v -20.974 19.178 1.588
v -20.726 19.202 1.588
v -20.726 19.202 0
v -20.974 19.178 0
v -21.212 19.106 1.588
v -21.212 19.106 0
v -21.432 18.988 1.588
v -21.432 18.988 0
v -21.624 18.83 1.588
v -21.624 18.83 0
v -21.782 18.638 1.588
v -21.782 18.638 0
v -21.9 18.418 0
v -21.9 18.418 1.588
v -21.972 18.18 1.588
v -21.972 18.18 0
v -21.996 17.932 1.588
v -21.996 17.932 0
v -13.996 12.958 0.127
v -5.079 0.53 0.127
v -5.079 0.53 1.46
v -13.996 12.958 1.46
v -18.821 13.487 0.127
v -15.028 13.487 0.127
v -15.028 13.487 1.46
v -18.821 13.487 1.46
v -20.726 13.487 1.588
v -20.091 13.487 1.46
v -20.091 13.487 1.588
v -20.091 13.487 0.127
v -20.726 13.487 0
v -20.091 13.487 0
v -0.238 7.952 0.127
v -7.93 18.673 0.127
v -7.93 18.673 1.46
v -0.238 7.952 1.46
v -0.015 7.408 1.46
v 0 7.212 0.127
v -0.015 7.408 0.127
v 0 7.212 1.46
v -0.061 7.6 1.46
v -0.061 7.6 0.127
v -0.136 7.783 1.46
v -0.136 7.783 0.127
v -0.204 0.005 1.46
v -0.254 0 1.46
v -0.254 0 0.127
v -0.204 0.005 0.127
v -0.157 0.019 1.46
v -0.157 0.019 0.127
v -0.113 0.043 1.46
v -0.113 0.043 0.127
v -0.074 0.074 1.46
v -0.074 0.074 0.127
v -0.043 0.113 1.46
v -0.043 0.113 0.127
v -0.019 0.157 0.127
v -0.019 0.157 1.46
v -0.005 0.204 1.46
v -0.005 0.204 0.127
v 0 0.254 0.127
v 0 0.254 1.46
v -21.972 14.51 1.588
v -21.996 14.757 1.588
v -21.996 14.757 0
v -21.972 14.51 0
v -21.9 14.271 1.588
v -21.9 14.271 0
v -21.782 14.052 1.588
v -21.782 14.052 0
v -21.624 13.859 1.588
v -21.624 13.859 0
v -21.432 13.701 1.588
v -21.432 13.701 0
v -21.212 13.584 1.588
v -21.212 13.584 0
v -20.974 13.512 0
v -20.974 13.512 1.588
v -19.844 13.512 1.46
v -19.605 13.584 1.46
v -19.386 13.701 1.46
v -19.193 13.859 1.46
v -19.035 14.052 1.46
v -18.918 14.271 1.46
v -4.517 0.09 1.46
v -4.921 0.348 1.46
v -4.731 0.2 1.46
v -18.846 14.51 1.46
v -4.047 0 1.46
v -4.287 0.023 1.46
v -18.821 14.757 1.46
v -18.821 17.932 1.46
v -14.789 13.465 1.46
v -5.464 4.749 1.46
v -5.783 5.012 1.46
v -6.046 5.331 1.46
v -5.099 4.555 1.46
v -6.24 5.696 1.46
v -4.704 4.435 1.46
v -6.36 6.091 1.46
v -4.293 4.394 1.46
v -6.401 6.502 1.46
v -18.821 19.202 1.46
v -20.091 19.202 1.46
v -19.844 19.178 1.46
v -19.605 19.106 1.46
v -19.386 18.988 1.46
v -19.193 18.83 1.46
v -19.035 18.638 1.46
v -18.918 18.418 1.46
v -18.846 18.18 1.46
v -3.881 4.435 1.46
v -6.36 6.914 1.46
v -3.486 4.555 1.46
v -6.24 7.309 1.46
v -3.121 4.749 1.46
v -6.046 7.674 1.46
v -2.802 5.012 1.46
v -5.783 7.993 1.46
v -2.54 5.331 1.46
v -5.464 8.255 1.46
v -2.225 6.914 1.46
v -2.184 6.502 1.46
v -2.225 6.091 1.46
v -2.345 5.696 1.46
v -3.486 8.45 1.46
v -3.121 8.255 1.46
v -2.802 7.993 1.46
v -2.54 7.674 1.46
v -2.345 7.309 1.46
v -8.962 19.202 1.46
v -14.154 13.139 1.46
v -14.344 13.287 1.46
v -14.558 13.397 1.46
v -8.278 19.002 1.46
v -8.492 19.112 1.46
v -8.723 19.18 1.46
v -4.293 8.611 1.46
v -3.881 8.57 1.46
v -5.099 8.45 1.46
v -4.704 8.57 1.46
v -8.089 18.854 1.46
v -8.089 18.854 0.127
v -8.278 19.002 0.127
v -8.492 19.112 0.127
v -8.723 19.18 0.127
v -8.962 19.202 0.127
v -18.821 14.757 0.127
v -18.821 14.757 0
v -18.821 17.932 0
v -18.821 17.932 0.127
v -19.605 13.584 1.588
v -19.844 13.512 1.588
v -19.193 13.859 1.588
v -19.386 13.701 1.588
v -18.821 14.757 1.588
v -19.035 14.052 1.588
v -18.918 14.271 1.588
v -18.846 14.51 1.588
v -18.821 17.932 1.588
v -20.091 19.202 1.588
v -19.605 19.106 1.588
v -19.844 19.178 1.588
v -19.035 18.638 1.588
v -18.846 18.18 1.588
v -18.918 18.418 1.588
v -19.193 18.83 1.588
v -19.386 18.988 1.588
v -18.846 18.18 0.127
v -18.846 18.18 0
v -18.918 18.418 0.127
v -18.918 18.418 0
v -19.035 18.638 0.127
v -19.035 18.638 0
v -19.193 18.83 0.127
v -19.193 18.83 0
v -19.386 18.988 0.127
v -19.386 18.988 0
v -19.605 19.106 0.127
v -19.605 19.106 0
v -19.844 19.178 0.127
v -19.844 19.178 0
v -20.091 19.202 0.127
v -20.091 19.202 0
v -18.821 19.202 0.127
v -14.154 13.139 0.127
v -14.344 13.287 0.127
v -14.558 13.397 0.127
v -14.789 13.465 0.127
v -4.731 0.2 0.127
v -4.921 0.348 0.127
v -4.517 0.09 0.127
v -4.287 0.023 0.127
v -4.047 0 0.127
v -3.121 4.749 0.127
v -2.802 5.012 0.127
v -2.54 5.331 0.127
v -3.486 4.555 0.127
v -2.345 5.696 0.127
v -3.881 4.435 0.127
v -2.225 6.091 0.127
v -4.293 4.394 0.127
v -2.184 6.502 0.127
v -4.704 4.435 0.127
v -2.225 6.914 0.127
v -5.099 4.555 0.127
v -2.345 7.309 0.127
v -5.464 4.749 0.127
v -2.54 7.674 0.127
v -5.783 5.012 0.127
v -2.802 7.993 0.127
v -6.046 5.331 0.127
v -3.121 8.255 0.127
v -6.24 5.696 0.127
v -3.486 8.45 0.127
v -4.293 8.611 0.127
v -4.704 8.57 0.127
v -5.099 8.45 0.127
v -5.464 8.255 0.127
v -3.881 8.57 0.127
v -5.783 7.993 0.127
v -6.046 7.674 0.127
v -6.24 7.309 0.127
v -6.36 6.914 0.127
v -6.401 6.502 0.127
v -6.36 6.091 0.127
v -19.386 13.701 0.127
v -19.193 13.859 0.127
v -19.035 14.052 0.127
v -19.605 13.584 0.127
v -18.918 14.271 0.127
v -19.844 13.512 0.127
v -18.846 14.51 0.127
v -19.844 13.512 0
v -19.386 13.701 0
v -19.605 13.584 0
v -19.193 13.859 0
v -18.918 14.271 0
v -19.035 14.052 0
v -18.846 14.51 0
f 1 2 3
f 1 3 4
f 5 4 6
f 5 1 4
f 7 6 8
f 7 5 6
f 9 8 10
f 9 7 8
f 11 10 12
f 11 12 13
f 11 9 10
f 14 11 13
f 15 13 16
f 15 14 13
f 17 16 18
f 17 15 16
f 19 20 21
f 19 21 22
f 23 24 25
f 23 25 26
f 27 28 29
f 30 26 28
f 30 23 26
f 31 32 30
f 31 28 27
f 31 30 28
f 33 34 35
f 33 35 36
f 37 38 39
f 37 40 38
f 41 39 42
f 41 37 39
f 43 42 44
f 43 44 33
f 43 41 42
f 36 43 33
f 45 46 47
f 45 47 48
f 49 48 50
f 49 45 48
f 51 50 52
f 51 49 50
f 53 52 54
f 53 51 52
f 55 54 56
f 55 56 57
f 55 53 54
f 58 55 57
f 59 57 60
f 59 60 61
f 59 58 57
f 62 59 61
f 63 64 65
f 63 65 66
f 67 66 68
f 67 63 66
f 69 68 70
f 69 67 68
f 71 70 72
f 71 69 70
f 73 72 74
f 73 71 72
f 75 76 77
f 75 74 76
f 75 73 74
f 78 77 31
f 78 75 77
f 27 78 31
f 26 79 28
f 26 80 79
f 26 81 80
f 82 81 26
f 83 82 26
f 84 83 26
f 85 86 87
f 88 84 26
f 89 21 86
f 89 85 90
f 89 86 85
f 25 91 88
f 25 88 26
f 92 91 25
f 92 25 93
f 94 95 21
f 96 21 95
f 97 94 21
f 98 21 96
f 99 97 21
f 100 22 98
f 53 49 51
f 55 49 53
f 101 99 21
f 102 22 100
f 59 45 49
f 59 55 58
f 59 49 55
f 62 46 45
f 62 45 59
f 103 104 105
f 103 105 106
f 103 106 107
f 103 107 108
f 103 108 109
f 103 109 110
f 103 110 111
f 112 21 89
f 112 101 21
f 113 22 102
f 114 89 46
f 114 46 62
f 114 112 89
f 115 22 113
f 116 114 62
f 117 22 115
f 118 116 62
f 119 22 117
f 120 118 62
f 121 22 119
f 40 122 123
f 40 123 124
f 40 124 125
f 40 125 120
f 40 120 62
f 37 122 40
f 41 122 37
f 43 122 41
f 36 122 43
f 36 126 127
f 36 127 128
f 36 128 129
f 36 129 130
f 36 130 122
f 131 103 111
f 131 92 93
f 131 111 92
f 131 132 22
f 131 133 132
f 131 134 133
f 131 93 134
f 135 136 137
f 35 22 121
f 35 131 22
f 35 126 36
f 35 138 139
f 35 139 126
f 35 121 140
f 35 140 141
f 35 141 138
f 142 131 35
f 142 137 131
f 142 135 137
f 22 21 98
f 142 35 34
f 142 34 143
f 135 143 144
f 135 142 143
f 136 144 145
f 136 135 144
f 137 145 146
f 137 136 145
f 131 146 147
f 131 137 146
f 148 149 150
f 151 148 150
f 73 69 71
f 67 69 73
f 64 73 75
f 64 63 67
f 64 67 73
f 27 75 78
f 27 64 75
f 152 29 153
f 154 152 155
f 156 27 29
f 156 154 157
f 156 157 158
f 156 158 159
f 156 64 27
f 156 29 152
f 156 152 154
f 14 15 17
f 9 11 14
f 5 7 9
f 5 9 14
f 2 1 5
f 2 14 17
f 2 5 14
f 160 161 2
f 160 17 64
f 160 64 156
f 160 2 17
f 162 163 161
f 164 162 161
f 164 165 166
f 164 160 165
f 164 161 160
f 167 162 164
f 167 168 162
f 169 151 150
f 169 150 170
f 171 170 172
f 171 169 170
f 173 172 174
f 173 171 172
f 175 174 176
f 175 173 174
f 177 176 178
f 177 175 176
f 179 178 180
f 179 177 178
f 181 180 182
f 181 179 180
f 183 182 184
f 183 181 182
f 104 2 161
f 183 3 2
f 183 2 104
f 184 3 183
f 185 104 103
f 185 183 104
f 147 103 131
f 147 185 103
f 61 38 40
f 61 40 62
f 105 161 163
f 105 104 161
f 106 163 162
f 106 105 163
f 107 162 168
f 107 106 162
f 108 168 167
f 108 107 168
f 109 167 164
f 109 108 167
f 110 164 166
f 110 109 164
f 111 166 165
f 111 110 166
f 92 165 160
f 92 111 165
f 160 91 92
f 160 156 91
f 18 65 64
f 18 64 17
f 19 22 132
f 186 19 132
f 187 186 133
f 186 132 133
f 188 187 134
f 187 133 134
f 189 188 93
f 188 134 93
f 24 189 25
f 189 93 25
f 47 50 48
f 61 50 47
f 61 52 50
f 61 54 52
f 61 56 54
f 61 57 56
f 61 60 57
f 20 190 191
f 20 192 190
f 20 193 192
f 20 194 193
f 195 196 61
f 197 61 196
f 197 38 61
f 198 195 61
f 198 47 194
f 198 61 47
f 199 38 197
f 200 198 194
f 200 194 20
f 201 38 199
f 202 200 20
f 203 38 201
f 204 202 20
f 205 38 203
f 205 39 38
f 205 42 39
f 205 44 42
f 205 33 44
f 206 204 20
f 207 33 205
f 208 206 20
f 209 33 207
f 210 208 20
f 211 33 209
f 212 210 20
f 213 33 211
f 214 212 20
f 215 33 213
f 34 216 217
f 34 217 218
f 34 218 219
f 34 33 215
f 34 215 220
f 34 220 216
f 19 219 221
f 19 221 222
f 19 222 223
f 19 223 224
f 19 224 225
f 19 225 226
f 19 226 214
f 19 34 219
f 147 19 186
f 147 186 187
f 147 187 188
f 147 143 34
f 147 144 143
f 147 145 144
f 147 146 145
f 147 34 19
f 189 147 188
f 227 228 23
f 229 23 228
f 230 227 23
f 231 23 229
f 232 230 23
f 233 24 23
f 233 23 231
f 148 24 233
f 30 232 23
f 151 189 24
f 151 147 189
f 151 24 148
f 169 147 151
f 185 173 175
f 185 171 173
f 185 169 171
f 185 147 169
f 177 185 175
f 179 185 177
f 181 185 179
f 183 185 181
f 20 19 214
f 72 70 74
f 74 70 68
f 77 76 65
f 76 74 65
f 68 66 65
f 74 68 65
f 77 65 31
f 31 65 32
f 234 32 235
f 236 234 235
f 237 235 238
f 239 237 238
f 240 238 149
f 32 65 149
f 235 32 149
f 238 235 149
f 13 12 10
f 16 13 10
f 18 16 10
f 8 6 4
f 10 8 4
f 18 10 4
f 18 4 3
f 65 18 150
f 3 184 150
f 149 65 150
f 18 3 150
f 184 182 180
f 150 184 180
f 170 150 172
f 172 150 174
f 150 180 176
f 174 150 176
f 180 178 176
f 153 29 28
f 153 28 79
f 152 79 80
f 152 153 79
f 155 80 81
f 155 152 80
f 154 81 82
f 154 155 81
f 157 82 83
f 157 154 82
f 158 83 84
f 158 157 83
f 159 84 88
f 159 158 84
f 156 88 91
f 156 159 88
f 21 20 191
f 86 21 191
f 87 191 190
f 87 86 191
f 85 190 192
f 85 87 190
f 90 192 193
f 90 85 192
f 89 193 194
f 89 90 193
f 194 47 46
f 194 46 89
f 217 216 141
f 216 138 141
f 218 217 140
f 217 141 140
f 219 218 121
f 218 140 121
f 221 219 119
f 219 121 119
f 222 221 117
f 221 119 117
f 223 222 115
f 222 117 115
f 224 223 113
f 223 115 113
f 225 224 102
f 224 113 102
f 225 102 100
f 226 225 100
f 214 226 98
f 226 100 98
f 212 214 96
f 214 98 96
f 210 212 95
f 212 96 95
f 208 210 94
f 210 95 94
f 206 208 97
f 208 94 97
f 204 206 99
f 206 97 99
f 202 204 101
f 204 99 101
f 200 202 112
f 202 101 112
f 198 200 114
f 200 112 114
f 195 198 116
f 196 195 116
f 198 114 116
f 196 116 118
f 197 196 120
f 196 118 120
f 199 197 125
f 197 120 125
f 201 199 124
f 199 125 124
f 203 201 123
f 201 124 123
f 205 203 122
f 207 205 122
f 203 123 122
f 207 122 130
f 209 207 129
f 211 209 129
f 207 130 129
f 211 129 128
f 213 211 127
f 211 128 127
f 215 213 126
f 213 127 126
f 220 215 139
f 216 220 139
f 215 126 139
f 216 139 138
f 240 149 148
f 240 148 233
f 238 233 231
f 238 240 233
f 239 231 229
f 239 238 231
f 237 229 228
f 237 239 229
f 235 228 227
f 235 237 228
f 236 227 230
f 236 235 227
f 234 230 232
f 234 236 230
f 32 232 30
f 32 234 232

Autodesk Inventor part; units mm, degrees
ref_plane "YZ Plane" through (0, 0, 0) normal (1, 0, 0) x (0, 1, 0)
ref_plane "XZ Plane" through (0, 0, 0) normal (0, 1, 0) x (-1, 0, 0)
ref_plane "XY Plane" through (0, 0, 0) normal (0, 0, 1) x (1, 0, 0)
sketch "Sketch1" plane through (0, 0, 0) normal (0, 0, 1) x (1, 0, 0)
  line L0 (0, 0) -> (-4.699, 0)
  line L1 (-4.699, 0) -> (-14.3764, 13.4874)
  line L2 (-14.3764, 13.4874) -> (-21.9964, 13.4874)
  line L3 (-21.9964, 13.4874) -> (-21.9964, 19.2024)
  line L4 (-21.9964, 19.2024) -> (-8.3105, 19.2024)
  line L5 (-8.3105, 19.2024) -> (0, 7.62)
  line L6 (0, 7.62) -> (0, 0)
  line L7 (0, 23.0429) -> (0, -3.8405) projected
  line L8 (-26.3957, 0) -> (4.3993, 0) projected
  dimension "d0" = 7.62
  dimension "d1" = 5.715
  dimension "d2" = 4.699
  dimension "d3" = 19.2024
  dimension "d4" = 21.9964
  dimension "d5" = 7.62
  dimension "d6" = 13.6859
  dimension "d7" = 14.2554
extrude "Extrusion1" add sketch "Sketch1" along normal blind 1.5875
sketch "Sketch2" plane through (0, 0, 0) normal (0, 0, 1) x (1, 0, 0)
  circle A0 centre (-4.2926, 6.5024) radius 0.635
  line L0 (-26.3957, 0) -> (4.3993, 0) projected
  line L1 (0, 23.0429) -> (0, -3.8405) projected
  line L2 (-21.9964, 13.4874) -> (-21.9964, 19.2024) projected
  line L3 (-21.9964, 19.2024) -> (-8.3105, 19.2024) projected
  point P0 (0, 0)
  dimension "d11" = 17.7038
  dimension "d12" = 12.7
  dimension "d13" = 1.27
hole "Hole1" at (-4.2926, 6.5024, 0) direction (0, 0, 1) diameter 4.2164 end through all
fillet "Fillet1" radius 1.27 6 edges at (-21.9964, 13.4874, 0.7937) (-14.3764, 13.4874, 0.7937) (-4.699, 0, 0.7937) (0, 7.62, 0.7937) (-8.3105, 19.2024, 0.7937) (-21.9964, 19.2024, 0.7937)
fillet "Fillet2" radius 0.254 1 edges at (0, 0, 0.7937)
sketch "Sketch3" plane through (0, 0, 1.5875) normal (0, 0, 1) x (1, 0, 0)
  line L0 (-20.7264, 19.2024) -> (-8.9624, 19.2024) projected
  circle A0 centre (-4.2926, 6.5024) radius 2.1082 projected
  line L1 (0, 0) -> (-18.8214, 0)
  line L2 (-18.8214, 0) -> (-18.8214, 19.2024)
  line L3 (-18.8214, 19.2024) -> (0, 19.2024)
  line L4 (0, 19.2024) -> (0, 0)
  point P0 (-21.9964, 17.9324)
  dimension "d23" = 3.175
extrude "Extrusion2" cut sketch "Sketch3" against normal blind 0.127
sketch "Sketch4" plane through (0, 0, 0) normal (0, 0, -1) x (-1, 0, 0)
  circle A0 centre (4.2926, 6.5024) radius 2.1082 projected
  line L0 (21.9964, 14.7574) -> (21.9964, 17.9324) projected
  line L1 (20.7264, 19.2024) -> (8.9624, 19.2024) projected
  line L2 (0, 0) -> (18.8214, 0)
  line L3 (18.8214, 0) -> (18.8214, 19.2024)
  line L4 (18.8214, 19.2024) -> (0, 19.2024)
  line L5 (0, 19.2024) -> (0, 0)
  dimension "d26" = 3.175
extrude "Extrusion3" cut sketch "Sketch4" against normal blind 0.127
fillet "Fillet3" radius 1.27 4 edges at (-18.8214, 13.4874, 0.0635) (-18.8214, 19.2024, 0.0635) (-18.8214, 19.2024, 1.524) (-18.8214, 13.4874, 1.524)
properties part number "J002856" material "STAINLESS STEEL, 303"
